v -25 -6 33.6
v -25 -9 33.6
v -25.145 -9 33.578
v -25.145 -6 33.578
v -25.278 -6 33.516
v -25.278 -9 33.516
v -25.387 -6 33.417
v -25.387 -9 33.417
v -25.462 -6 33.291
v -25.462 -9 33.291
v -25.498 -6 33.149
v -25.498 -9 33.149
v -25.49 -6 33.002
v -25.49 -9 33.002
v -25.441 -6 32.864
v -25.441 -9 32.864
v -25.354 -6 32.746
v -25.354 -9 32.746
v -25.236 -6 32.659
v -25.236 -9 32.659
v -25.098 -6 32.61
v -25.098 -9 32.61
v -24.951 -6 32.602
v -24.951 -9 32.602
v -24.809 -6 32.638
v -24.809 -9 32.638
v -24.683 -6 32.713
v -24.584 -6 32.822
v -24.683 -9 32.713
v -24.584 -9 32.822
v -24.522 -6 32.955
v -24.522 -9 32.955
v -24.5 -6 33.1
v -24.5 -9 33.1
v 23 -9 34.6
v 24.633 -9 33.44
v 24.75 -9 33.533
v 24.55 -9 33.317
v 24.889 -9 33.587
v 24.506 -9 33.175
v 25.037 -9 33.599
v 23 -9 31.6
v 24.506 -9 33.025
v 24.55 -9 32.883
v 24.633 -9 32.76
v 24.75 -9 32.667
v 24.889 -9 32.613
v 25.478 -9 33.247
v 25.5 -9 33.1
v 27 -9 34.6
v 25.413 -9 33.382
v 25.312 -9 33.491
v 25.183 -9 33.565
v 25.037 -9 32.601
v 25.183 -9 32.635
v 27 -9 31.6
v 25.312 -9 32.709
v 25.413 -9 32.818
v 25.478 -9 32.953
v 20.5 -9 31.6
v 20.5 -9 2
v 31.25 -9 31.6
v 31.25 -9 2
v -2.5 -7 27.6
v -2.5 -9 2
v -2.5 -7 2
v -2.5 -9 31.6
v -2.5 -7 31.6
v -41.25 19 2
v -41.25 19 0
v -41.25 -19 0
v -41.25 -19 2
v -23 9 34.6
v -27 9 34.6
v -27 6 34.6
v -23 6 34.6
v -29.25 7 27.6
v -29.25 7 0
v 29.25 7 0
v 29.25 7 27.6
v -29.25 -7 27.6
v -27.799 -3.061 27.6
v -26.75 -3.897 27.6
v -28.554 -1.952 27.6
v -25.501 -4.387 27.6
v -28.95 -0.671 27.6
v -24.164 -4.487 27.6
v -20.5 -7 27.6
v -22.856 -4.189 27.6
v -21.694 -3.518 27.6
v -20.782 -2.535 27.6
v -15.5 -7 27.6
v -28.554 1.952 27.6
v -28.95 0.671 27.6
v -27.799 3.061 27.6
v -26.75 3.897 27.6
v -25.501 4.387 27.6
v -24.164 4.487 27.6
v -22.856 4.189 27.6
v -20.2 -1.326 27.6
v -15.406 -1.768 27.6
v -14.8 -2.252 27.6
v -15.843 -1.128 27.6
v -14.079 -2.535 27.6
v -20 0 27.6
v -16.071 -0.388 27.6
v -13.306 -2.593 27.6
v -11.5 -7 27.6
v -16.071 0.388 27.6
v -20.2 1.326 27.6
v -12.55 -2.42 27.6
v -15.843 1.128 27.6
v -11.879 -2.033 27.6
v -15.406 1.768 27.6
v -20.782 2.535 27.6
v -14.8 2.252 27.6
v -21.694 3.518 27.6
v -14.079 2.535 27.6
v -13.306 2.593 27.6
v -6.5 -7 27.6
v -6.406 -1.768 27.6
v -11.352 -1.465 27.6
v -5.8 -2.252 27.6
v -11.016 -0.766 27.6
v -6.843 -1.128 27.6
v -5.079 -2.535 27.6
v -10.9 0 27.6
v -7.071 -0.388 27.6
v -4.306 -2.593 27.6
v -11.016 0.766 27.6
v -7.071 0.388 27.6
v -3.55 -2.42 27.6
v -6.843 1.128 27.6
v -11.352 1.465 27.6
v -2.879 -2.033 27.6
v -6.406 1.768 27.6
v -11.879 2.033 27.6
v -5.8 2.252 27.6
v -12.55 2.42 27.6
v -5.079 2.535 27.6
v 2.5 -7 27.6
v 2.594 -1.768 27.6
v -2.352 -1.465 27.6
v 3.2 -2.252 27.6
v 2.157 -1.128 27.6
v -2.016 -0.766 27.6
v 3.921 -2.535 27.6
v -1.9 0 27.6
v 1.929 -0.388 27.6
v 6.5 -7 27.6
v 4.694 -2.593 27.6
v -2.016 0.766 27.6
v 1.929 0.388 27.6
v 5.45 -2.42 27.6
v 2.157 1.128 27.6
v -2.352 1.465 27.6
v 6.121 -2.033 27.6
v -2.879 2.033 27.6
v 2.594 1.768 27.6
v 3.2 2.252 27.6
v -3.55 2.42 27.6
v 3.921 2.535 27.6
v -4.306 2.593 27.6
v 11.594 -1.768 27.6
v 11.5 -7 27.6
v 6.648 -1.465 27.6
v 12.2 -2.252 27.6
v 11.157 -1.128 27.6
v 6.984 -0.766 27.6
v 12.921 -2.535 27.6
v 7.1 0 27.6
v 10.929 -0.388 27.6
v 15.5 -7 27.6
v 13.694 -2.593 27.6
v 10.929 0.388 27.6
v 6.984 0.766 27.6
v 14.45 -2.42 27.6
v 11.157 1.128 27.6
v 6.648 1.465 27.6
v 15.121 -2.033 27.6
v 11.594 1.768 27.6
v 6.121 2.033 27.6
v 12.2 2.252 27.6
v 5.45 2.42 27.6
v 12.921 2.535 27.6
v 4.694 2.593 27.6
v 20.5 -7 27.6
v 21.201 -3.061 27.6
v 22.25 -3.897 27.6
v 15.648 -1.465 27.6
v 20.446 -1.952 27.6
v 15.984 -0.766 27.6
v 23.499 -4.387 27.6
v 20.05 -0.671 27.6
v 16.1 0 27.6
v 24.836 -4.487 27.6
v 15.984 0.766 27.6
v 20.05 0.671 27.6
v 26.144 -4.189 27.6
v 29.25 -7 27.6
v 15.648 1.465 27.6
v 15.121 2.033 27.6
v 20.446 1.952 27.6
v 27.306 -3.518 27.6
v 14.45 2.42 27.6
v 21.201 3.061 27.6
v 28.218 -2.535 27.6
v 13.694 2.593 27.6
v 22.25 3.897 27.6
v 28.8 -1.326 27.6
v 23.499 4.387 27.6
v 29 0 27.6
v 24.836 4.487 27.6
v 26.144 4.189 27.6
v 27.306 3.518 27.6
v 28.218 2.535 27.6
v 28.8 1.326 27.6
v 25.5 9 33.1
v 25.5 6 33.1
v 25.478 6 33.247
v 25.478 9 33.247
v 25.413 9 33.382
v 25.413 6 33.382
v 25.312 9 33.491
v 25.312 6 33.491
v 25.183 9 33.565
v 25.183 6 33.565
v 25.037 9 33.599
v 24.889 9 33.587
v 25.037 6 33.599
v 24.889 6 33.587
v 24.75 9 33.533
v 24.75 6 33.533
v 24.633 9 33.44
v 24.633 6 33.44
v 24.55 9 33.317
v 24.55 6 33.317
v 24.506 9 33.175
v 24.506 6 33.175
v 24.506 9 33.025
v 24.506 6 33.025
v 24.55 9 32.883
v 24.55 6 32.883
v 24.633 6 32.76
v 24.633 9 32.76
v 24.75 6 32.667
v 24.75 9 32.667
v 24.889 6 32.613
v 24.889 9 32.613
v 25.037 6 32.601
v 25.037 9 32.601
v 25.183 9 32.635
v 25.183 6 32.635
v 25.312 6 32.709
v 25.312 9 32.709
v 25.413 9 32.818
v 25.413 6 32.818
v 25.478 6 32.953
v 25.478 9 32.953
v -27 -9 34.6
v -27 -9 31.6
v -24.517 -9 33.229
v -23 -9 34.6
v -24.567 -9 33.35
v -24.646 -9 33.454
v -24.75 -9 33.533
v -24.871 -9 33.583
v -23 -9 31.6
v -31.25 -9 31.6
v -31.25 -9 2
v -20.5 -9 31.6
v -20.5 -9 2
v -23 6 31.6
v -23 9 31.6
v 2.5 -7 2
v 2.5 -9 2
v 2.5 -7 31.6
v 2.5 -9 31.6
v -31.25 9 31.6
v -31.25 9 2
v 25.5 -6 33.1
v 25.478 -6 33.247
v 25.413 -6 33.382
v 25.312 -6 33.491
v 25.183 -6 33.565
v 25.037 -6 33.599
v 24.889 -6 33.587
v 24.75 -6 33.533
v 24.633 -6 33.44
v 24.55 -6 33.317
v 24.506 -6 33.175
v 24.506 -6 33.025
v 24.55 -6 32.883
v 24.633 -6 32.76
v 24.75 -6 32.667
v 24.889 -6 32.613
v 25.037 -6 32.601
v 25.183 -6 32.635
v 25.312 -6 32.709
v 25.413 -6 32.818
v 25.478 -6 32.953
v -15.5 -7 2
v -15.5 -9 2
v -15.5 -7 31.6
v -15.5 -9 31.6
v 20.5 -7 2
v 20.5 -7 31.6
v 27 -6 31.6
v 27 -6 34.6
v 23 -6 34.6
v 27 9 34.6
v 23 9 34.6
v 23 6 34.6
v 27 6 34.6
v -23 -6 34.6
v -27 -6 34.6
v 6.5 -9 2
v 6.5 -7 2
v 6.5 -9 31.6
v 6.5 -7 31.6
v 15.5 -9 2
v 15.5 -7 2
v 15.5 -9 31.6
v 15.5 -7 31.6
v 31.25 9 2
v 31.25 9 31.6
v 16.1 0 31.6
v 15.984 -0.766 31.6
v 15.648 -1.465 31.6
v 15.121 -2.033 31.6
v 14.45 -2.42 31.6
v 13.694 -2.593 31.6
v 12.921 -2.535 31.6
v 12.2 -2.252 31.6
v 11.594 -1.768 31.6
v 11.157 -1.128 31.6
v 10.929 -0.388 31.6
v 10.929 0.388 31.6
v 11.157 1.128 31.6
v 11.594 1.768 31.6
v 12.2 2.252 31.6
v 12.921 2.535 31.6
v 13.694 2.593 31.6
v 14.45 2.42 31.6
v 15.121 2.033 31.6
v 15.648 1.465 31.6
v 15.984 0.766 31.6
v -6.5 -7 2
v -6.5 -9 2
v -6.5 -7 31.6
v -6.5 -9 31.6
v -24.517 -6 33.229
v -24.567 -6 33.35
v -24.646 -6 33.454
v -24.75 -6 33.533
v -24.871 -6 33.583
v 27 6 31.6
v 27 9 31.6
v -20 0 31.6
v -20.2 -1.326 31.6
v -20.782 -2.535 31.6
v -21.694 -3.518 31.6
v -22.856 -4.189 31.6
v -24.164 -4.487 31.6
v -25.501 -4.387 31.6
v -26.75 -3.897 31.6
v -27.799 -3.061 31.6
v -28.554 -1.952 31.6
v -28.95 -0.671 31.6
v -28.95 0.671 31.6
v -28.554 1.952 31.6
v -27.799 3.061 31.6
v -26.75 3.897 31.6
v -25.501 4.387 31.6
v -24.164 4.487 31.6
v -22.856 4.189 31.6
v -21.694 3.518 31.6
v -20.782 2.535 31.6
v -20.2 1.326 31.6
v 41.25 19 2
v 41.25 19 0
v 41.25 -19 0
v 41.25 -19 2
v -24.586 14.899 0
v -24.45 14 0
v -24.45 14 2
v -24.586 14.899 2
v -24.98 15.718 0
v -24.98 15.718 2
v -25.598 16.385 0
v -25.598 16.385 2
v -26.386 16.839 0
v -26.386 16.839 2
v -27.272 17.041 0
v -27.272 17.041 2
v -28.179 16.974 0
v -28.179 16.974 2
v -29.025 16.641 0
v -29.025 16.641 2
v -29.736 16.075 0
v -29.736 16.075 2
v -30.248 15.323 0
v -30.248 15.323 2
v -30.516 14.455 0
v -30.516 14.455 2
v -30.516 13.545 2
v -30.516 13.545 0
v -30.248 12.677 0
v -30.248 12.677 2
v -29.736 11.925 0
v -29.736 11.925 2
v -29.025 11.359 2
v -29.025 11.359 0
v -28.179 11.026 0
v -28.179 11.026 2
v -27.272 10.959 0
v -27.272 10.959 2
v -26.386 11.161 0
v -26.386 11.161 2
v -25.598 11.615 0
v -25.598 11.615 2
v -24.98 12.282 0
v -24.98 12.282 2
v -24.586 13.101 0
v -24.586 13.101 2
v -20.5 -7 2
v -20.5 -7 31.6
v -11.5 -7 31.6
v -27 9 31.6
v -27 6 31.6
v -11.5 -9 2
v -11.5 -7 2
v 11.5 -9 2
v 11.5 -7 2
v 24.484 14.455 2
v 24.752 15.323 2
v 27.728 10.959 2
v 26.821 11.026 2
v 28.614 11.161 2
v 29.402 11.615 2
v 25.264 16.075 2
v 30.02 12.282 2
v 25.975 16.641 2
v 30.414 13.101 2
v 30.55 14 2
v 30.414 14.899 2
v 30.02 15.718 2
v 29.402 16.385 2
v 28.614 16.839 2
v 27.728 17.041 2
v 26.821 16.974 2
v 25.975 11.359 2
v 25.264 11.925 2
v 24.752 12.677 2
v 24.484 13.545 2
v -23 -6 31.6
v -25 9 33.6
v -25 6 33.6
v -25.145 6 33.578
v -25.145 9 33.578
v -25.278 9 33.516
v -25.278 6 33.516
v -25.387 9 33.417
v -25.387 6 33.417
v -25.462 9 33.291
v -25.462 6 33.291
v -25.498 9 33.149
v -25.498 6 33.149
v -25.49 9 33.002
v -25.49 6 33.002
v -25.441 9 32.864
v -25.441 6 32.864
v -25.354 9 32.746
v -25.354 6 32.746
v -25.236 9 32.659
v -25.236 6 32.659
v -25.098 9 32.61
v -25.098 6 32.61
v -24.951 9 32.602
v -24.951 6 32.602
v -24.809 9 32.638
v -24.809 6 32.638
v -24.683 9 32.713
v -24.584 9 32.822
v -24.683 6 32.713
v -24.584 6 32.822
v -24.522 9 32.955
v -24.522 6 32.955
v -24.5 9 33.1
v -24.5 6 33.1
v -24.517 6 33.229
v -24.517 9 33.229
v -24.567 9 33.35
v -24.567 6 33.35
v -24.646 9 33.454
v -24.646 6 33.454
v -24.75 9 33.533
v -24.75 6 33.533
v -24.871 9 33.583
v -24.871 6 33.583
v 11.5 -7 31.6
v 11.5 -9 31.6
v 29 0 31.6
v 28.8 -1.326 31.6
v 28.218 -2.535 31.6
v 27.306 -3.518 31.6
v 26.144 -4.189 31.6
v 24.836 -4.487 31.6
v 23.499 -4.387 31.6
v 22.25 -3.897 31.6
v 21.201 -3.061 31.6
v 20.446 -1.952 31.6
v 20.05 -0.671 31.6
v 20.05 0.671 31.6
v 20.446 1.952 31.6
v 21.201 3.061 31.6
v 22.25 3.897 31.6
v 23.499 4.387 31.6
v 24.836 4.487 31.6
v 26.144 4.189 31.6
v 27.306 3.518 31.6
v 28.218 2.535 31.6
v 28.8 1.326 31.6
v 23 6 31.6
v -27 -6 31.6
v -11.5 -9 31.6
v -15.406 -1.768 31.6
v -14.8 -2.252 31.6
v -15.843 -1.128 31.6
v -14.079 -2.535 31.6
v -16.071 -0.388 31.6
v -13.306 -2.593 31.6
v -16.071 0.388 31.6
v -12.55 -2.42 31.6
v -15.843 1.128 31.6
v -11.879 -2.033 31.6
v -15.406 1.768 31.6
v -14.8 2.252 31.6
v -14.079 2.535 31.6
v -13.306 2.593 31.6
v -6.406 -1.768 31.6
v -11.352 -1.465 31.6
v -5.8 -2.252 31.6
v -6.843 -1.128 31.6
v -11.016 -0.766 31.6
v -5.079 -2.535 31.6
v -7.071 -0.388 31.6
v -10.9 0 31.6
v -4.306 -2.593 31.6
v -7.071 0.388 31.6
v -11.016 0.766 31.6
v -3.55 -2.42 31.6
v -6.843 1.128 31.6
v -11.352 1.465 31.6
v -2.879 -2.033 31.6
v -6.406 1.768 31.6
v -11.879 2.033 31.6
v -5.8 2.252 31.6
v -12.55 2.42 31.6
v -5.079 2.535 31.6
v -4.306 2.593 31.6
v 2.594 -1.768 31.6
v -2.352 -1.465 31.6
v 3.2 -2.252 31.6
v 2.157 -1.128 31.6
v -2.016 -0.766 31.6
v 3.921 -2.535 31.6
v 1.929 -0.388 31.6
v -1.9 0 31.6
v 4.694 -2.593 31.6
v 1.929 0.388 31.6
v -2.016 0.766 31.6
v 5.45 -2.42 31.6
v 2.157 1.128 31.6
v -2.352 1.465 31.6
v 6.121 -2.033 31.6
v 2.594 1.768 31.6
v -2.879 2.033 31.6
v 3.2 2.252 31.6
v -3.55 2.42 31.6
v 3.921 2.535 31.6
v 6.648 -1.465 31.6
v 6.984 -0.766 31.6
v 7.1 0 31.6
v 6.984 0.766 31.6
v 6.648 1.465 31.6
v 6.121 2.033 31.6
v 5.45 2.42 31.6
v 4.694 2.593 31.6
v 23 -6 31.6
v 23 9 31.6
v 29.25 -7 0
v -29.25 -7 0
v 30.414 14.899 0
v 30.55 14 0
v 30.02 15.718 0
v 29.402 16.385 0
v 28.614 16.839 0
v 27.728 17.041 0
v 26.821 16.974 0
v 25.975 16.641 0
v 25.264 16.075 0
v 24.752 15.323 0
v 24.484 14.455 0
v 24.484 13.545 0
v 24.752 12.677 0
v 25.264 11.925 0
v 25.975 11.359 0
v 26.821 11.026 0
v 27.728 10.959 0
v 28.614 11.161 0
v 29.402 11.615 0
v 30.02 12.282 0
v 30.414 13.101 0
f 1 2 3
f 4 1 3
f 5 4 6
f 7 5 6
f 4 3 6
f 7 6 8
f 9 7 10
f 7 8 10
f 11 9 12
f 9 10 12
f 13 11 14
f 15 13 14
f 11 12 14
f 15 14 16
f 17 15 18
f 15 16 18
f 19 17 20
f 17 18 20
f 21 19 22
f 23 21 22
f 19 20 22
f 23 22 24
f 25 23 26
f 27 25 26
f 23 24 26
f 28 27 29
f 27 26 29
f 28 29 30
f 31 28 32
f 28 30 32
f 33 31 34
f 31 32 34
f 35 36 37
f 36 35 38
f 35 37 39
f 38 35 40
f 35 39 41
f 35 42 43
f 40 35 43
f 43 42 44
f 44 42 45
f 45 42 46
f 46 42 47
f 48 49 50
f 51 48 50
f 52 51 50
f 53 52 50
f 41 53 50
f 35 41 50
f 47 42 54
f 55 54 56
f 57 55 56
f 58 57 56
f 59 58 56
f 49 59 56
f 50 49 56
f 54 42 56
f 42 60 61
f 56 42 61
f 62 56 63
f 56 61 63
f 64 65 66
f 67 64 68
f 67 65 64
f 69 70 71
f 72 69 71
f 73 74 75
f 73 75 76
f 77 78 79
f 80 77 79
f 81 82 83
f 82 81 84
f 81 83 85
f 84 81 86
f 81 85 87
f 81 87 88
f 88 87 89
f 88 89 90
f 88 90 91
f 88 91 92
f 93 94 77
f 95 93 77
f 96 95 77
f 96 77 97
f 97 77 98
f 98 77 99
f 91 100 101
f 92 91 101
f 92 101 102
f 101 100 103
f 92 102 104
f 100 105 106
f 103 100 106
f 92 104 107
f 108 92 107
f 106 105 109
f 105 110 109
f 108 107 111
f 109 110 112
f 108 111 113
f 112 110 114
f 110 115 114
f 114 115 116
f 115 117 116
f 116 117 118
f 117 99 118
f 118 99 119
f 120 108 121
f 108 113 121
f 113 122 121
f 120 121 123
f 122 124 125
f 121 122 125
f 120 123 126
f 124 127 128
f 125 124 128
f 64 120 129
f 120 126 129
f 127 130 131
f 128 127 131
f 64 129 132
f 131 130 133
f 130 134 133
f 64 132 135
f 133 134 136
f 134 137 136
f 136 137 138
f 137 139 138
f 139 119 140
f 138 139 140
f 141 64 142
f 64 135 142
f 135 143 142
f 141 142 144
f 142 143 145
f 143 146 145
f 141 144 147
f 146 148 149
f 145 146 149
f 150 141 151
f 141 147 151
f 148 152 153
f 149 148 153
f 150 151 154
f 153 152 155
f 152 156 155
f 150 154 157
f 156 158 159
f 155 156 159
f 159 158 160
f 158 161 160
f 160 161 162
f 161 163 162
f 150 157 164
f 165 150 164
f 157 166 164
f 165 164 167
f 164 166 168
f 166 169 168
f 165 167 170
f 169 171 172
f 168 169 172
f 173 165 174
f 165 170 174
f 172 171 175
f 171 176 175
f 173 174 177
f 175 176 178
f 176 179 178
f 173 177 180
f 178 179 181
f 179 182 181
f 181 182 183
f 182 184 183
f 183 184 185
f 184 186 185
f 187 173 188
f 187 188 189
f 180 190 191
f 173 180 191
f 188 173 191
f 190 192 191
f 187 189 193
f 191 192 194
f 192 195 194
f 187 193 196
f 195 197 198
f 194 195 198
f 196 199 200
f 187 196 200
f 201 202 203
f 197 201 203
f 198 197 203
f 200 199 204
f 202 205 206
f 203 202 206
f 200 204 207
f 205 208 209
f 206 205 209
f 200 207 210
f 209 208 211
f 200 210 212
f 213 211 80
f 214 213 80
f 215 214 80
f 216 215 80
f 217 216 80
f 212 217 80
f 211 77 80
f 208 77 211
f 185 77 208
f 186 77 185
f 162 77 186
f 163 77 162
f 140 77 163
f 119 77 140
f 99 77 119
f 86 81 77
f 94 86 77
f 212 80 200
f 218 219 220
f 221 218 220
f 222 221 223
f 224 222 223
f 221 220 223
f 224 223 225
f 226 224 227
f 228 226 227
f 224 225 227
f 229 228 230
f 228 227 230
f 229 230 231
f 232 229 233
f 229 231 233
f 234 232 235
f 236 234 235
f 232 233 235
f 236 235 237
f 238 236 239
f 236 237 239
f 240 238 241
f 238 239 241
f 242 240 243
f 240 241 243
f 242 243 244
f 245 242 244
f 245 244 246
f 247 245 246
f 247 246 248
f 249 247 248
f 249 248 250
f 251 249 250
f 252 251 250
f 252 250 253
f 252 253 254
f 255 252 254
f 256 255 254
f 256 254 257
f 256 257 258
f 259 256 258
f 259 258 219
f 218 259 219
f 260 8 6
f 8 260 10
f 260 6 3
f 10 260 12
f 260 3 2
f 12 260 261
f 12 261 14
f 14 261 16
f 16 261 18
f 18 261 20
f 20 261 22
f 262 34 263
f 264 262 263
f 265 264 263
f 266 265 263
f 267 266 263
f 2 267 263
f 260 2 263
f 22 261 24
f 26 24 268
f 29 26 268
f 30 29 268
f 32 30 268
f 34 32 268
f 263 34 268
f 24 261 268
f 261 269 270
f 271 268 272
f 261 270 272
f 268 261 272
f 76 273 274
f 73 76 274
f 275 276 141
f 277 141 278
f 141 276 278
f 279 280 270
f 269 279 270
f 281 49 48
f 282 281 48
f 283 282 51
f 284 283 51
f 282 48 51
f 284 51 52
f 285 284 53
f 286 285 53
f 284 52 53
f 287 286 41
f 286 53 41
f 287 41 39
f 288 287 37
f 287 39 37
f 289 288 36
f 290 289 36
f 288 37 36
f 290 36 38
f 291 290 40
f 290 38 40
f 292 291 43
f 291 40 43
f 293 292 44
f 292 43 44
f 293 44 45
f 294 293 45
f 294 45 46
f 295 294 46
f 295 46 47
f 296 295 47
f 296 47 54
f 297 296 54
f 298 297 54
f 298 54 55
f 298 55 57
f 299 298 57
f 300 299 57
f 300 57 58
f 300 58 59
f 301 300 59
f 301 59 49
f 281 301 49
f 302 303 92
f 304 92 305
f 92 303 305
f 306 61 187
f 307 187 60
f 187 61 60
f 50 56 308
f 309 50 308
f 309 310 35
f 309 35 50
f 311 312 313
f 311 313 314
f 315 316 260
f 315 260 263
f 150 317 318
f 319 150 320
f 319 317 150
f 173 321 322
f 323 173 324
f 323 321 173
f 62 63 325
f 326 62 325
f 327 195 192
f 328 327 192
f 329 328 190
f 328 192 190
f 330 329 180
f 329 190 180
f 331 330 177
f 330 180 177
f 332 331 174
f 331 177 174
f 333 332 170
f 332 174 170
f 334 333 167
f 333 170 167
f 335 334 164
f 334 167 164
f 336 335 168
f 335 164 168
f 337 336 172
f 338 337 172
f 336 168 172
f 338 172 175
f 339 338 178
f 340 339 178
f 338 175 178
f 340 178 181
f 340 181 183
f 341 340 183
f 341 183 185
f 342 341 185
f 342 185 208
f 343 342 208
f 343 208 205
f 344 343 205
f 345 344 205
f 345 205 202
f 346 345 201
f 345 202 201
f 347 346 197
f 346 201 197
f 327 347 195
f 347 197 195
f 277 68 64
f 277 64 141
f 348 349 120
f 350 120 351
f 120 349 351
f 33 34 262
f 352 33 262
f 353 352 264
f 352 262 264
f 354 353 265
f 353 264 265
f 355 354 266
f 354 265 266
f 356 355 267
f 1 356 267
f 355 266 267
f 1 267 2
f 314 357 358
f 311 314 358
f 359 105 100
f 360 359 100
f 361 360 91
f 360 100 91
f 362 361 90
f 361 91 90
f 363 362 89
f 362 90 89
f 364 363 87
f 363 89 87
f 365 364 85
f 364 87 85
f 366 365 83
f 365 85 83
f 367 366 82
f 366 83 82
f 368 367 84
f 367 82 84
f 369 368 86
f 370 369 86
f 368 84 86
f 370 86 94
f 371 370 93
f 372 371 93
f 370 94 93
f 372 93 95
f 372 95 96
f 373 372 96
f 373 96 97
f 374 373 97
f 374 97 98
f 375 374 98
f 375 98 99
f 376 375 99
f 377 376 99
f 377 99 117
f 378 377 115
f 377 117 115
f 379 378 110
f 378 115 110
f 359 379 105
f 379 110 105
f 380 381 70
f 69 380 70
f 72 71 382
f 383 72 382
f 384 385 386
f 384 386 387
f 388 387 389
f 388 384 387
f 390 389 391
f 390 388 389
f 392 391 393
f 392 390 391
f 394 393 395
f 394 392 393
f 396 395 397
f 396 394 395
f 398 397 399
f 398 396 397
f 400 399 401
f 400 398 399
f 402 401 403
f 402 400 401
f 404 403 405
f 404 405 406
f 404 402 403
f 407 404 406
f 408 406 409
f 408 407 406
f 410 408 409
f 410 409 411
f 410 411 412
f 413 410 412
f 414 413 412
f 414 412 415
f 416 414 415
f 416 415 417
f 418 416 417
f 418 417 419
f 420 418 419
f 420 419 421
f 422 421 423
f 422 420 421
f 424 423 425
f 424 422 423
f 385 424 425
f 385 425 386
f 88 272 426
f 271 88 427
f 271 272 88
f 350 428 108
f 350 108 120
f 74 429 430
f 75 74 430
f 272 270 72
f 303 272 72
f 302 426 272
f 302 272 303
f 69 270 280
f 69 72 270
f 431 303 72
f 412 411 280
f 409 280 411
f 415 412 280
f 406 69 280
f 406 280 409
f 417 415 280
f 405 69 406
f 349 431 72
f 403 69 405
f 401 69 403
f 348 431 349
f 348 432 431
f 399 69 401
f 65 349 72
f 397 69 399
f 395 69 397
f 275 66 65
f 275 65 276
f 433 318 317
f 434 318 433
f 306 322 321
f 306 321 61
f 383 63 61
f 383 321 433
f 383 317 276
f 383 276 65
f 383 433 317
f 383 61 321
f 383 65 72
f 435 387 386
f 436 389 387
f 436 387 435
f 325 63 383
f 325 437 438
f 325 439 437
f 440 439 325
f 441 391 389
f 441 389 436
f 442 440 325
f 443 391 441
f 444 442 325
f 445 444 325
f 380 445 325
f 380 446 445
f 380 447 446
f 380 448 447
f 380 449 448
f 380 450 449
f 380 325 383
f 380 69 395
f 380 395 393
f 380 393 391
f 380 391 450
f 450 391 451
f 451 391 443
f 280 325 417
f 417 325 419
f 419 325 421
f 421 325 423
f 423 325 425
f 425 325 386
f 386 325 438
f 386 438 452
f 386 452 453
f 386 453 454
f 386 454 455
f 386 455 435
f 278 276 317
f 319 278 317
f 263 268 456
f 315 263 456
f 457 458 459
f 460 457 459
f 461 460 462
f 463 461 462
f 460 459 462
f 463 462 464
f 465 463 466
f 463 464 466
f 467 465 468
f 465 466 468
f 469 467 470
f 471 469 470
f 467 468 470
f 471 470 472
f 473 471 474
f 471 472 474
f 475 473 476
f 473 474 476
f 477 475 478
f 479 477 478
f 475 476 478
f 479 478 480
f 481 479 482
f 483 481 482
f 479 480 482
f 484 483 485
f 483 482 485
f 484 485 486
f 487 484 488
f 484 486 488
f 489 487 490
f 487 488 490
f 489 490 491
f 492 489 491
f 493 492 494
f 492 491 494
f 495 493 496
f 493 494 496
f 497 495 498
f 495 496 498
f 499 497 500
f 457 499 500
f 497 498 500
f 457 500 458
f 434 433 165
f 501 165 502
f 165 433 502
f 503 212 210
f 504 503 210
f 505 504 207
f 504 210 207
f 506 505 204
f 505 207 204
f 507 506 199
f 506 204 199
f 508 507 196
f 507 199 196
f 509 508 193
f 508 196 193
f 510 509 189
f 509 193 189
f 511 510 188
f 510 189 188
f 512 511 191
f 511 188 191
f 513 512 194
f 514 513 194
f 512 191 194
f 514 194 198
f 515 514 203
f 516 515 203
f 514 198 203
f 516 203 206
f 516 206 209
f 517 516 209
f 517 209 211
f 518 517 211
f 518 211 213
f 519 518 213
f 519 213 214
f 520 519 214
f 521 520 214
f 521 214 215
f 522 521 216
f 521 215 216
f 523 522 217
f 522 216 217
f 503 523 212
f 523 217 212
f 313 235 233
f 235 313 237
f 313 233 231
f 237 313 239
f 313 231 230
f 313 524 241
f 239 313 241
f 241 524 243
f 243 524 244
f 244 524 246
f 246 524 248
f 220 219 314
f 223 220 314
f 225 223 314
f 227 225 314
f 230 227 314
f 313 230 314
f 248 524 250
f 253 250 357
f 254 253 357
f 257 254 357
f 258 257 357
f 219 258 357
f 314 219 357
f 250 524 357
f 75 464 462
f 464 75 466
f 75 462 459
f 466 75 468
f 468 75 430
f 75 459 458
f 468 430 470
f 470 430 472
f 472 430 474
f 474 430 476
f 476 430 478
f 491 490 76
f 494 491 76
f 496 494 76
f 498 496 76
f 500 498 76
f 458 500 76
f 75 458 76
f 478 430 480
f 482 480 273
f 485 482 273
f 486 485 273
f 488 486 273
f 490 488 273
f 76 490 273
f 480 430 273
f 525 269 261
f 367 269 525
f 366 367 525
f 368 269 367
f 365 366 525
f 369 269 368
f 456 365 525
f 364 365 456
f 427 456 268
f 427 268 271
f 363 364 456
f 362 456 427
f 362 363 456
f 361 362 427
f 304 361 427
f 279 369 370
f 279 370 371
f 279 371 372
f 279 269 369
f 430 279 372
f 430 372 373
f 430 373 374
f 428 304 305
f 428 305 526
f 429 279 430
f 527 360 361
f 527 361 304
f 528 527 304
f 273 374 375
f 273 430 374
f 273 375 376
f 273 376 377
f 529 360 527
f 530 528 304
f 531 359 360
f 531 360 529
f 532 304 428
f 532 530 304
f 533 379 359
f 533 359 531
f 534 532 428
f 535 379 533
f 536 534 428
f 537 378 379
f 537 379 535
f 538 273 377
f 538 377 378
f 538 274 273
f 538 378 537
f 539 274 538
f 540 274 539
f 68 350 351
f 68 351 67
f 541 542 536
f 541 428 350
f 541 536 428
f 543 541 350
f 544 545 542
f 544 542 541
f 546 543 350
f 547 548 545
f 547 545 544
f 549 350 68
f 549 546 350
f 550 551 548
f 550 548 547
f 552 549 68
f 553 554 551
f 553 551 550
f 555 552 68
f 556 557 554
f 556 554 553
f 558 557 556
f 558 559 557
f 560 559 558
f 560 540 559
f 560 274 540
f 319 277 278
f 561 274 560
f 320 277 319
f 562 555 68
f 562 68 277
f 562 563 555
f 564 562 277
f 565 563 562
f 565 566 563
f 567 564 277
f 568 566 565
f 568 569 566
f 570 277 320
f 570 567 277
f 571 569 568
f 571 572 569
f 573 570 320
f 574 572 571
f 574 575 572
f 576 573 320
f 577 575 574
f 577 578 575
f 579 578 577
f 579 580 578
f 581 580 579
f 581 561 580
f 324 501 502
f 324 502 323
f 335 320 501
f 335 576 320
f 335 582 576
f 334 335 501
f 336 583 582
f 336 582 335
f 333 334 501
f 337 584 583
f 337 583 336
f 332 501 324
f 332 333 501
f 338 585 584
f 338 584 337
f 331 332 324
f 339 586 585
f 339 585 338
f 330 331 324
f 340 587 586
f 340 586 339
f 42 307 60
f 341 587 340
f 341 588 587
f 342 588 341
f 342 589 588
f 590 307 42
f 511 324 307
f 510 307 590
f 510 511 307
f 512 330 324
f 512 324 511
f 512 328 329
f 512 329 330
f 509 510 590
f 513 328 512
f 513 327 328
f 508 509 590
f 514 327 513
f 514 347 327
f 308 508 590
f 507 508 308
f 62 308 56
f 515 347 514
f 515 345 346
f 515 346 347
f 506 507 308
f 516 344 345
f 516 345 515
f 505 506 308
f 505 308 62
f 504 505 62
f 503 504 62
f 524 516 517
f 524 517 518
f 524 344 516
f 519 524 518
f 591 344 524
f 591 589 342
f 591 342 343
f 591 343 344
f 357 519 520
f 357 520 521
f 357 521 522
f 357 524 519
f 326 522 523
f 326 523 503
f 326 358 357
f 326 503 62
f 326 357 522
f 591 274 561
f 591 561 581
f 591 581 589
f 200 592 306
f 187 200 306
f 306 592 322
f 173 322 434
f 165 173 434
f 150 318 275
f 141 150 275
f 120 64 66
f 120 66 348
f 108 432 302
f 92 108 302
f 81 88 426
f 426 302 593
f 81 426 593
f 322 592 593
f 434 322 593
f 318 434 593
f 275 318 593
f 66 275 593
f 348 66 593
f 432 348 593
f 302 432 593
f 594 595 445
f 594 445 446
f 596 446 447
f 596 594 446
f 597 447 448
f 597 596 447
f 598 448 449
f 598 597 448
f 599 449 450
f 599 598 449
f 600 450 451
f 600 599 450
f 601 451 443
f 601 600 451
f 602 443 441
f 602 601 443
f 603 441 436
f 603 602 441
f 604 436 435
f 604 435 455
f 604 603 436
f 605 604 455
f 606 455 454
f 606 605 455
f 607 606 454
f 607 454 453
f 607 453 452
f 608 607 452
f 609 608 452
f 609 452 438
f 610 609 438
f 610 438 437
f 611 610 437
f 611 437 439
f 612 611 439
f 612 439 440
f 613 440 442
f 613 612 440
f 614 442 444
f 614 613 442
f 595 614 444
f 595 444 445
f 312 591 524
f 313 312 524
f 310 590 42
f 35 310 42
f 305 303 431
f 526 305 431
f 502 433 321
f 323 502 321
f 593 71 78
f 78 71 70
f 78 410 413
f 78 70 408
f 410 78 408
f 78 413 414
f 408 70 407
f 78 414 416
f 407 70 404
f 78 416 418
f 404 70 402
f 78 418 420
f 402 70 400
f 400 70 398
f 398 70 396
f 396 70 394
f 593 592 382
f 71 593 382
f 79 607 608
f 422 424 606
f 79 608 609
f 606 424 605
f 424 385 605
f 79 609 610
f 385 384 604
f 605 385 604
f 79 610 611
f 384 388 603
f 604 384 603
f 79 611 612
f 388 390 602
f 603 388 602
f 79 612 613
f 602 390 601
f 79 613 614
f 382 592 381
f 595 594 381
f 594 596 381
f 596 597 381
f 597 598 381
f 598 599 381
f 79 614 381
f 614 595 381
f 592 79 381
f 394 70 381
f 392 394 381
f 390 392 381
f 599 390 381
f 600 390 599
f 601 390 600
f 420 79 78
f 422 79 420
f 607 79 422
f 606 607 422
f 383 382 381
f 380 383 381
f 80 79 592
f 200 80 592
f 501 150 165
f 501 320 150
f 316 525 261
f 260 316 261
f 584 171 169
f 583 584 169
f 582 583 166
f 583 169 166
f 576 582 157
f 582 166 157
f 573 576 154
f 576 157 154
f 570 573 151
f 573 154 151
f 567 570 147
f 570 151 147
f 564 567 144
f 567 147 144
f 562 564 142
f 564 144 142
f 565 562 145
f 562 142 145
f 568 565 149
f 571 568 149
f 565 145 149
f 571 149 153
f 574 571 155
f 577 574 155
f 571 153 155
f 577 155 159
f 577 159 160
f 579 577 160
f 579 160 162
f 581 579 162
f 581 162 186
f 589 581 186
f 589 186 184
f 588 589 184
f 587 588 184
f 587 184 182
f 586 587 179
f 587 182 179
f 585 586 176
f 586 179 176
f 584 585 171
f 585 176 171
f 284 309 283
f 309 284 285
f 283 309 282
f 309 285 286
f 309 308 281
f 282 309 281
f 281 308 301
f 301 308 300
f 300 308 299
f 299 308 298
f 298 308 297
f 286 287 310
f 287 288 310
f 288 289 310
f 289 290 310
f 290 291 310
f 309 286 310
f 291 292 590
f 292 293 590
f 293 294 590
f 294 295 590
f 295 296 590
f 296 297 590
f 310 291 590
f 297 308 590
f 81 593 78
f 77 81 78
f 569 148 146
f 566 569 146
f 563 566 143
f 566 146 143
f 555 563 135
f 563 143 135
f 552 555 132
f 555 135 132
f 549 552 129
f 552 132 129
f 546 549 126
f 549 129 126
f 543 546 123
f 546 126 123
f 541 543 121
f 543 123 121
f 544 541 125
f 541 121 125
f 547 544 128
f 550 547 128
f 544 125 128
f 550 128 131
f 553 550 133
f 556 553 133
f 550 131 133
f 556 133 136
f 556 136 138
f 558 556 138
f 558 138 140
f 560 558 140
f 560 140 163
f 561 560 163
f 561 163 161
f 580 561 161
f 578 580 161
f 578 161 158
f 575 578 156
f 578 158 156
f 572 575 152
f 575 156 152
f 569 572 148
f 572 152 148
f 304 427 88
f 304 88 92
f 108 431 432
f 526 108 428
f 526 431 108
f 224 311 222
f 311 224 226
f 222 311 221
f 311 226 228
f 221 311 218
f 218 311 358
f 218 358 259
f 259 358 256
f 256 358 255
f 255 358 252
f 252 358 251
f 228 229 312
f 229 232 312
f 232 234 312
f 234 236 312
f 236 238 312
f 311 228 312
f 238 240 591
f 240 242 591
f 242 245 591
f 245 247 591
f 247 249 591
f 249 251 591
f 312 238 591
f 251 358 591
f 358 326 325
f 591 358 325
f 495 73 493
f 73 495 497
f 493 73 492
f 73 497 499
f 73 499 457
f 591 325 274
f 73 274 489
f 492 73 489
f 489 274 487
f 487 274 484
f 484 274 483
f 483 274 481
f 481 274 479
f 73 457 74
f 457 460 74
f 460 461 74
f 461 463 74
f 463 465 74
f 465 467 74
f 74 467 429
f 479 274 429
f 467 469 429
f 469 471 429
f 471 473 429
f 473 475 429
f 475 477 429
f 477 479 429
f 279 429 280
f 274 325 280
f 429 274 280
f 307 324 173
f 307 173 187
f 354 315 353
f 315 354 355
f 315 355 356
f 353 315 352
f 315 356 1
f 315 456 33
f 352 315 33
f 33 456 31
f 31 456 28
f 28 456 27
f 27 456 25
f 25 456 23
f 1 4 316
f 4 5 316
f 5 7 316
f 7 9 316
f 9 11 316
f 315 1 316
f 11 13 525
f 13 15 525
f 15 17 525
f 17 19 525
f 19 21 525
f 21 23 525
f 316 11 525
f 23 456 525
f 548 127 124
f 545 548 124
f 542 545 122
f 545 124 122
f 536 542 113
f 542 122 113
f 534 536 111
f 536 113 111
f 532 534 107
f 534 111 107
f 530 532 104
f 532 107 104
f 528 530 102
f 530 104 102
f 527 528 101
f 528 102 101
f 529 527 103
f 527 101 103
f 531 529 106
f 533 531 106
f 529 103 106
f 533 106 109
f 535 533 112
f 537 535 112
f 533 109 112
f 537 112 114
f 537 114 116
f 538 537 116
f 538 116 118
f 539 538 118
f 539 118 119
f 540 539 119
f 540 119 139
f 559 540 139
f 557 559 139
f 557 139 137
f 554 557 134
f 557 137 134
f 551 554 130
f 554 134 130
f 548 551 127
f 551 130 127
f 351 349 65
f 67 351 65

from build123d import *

# Parameters (mm, degrees)
F1_DEPTH = 31.6
F2_START = 27.6
F2_DEPTH = 4
F0_R     = 3.05
F3_DEPTH = 2
F4_W     = 2.5
F4_H     = 29.6
F5_DEPTH = 2
F7_DEPTH = 3
F8_R     = 0.5
F9_DEPTH = 25


with BuildPart() as f1:
    # F0 (on Top) → F1 (new body)
    with BuildSketch(Plane.XY):
        Polygon((31.25, -9), (31.25, 0), (29.25, 0), (29.25, -7), (-29.25, -7), (-29.25, 0), (-31.25, 0), (-31.25, -9), align=None)
        Polygon((31.25, 0), (31.25, 9), (-31.25, 9), (-31.25, 0), (-29.25, 0), (-29.25, 7), (29.25, 7), (29.25, 0), align=None)
    extrude(amount=F1_DEPTH)

    # F0 (on Top) → F2 (join)
    with BuildSketch(Plane.XY.offset(F2_START)):
        with BuildLine():
            Line((29, 0), (29.25, 0))
            Line((29.25, 0), (29.25, 7))
            Line((29.25, 7), (-29.25, 7))
            Line((-29.25, 7), (-29.25, 0))
            Line((-29.25, 0), (-29, 0))
            ThreePointArc((-29, 0), (-24.5, 4.5), (-20, 0))
            Line((-20, 0), (-16.1, 0))
            ThreePointArc((-16.1, 0), (-13.5, 2.6), (-10.9, 0))
            Line((-10.9, 0), (-7.1, 0))
            ThreePointArc((-7.1, 0), (-4.5, 2.6), (-1.9, 0))
            Line((-1.9, 0), (0, 0))
            Line((0, 0), (1.9, 0))
            ThreePointArc((1.9, 0), (4.5, 2.6), (7.1, 0))
            Line((7.1, 0), (10.9, 0))
            ThreePointArc((10.9, 0), (13.5, 2.6), (16.1, 0))
            Line((16.1, 0), (20, 0))
            ThreePointArc((20, 0), (24.5, 4.5), (29, 0))
        make_face()
        with BuildLine():
            Line((29.25, -7), (29.25, 0))
            Line((29.25, 0), (29, 0))
            ThreePointArc((29, 0), (24.5, -4.5), (20, 0))
            Line((20, 0), (16.1, 0))
            ThreePointArc((16.1, 0), (13.5, -2.6), (10.9, 0))
            Line((10.9, 0), (7.1, 0))
            ThreePointArc((7.1, 0), (4.5, -2.6), (1.9, 0))
            Line((1.9, 0), (0, 0))
            Line((0, 0), (-1.9, 0))
            ThreePointArc((-1.9, 0), (-4.5, -2.6), (-7.1, 0))
            Line((-7.1, 0), (-10.9, 0))
            ThreePointArc((-10.9, 0), (-13.5, -2.6), (-16.1, 0))
            Line((-16.1, 0), (-20, 0))
            ThreePointArc((-20, 0), (-24.5, -4.5), (-29, 0))
            Line((-29, 0), (-29.25, 0))
            Line((-29.25, 0), (-29.25, -7))
            Line((-29.25, -7), (29.25, -7))
        make_face()
    extrude(amount=F2_DEPTH)

    # F0 (on Top) → F3 (join)
    with BuildSketch(Plane.XY):
        Polygon((-41.25, 19), (-41.25, 14), (-41.25, -19), (41.25, -19), (41.25, 19), align=None)
        with Locations((-27.5, 14)):
            Circle(F0_R, mode=Mode.SUBTRACT)
        Polygon((-31.25, 9), (31.25, 9), (31.25, 0), (31.25, -9), (-31.25, -9), (-31.25, 0), align=None, mode=Mode.SUBTRACT)
        with Locations((27.5, 14)):
            Circle(F0_R, mode=Mode.SUBTRACT)
    extrude(amount=F3_DEPTH)

    # F4 (on face) → F5 (cut)
    with BuildSketch(Plane.XZ.offset(9)):
        with Locations((-1.25, 16.8)):
            Rectangle(F4_W, F4_H)
        with Locations((1.25, 16.8)):
            Rectangle(F4_W, F4_H)
        with Locations((-19.25, 16.8)):
            Rectangle(F4_W, F4_H)
        with Locations((-16.75, 16.8)):
            Rectangle(F4_W, F4_H)
        with Locations((-10.25, 16.8)):
            Rectangle(F4_W, F4_H)
        with Locations((-7.75, 16.8)):
            Rectangle(F4_W, F4_H)
        with Locations((10.25, 16.8)):
            Rectangle(F4_W, F4_H)
        with Locations((7.75, 16.8)):
            Rectangle(F4_W, F4_H)
        with Locations((16.75, 16.8)):
            Rectangle(F4_W, F4_H)
        with Locations((19.25, 16.8)):
            Rectangle(F4_W, F4_H)
    extrude(amount=-F5_DEPTH, mode=Mode.SUBTRACT)

    # F6 (on face) → F7 (join)
    with BuildSketch(Plane.XY.offset(31.6)):
        Polygon((-27, -6), (-27, -9), (-25, -9), (-23, -9), (-23, -6), (-25, -6), align=None)
        Polygon((23, -6), (23, -9), (25, -9), (27, -9), (27, -6), (25, -6), align=None)
        Polygon((-23, 6), (-23, 9), (-25, 9), (-27, 9), (-27, 6), (-25, 6), align=None)
        Polygon((25, 6), (27, 6), (27, 9), (25, 9), (23, 9), (23, 6), align=None)
    extrude(amount=F7_DEPTH)

    # F8 (on face) → F9 (cut)
    with BuildSketch(Plane.XZ.offset(9)):
        with BuildLine():
            ThreePointArc((-25, 33.6), (-25.3535533906, 32.7464466094), (-24.5, 33.1))
            ThreePointArc((-24.5, 33.1), (-24.6464466094, 33.4535533906), (-25, 33.6))
        make_face()
        with Locations((25, 33.1)):
            Circle(F8_R)
    extrude(amount=-F9_DEPTH, mode=Mode.SUBTRACT)


solid = f1.part
